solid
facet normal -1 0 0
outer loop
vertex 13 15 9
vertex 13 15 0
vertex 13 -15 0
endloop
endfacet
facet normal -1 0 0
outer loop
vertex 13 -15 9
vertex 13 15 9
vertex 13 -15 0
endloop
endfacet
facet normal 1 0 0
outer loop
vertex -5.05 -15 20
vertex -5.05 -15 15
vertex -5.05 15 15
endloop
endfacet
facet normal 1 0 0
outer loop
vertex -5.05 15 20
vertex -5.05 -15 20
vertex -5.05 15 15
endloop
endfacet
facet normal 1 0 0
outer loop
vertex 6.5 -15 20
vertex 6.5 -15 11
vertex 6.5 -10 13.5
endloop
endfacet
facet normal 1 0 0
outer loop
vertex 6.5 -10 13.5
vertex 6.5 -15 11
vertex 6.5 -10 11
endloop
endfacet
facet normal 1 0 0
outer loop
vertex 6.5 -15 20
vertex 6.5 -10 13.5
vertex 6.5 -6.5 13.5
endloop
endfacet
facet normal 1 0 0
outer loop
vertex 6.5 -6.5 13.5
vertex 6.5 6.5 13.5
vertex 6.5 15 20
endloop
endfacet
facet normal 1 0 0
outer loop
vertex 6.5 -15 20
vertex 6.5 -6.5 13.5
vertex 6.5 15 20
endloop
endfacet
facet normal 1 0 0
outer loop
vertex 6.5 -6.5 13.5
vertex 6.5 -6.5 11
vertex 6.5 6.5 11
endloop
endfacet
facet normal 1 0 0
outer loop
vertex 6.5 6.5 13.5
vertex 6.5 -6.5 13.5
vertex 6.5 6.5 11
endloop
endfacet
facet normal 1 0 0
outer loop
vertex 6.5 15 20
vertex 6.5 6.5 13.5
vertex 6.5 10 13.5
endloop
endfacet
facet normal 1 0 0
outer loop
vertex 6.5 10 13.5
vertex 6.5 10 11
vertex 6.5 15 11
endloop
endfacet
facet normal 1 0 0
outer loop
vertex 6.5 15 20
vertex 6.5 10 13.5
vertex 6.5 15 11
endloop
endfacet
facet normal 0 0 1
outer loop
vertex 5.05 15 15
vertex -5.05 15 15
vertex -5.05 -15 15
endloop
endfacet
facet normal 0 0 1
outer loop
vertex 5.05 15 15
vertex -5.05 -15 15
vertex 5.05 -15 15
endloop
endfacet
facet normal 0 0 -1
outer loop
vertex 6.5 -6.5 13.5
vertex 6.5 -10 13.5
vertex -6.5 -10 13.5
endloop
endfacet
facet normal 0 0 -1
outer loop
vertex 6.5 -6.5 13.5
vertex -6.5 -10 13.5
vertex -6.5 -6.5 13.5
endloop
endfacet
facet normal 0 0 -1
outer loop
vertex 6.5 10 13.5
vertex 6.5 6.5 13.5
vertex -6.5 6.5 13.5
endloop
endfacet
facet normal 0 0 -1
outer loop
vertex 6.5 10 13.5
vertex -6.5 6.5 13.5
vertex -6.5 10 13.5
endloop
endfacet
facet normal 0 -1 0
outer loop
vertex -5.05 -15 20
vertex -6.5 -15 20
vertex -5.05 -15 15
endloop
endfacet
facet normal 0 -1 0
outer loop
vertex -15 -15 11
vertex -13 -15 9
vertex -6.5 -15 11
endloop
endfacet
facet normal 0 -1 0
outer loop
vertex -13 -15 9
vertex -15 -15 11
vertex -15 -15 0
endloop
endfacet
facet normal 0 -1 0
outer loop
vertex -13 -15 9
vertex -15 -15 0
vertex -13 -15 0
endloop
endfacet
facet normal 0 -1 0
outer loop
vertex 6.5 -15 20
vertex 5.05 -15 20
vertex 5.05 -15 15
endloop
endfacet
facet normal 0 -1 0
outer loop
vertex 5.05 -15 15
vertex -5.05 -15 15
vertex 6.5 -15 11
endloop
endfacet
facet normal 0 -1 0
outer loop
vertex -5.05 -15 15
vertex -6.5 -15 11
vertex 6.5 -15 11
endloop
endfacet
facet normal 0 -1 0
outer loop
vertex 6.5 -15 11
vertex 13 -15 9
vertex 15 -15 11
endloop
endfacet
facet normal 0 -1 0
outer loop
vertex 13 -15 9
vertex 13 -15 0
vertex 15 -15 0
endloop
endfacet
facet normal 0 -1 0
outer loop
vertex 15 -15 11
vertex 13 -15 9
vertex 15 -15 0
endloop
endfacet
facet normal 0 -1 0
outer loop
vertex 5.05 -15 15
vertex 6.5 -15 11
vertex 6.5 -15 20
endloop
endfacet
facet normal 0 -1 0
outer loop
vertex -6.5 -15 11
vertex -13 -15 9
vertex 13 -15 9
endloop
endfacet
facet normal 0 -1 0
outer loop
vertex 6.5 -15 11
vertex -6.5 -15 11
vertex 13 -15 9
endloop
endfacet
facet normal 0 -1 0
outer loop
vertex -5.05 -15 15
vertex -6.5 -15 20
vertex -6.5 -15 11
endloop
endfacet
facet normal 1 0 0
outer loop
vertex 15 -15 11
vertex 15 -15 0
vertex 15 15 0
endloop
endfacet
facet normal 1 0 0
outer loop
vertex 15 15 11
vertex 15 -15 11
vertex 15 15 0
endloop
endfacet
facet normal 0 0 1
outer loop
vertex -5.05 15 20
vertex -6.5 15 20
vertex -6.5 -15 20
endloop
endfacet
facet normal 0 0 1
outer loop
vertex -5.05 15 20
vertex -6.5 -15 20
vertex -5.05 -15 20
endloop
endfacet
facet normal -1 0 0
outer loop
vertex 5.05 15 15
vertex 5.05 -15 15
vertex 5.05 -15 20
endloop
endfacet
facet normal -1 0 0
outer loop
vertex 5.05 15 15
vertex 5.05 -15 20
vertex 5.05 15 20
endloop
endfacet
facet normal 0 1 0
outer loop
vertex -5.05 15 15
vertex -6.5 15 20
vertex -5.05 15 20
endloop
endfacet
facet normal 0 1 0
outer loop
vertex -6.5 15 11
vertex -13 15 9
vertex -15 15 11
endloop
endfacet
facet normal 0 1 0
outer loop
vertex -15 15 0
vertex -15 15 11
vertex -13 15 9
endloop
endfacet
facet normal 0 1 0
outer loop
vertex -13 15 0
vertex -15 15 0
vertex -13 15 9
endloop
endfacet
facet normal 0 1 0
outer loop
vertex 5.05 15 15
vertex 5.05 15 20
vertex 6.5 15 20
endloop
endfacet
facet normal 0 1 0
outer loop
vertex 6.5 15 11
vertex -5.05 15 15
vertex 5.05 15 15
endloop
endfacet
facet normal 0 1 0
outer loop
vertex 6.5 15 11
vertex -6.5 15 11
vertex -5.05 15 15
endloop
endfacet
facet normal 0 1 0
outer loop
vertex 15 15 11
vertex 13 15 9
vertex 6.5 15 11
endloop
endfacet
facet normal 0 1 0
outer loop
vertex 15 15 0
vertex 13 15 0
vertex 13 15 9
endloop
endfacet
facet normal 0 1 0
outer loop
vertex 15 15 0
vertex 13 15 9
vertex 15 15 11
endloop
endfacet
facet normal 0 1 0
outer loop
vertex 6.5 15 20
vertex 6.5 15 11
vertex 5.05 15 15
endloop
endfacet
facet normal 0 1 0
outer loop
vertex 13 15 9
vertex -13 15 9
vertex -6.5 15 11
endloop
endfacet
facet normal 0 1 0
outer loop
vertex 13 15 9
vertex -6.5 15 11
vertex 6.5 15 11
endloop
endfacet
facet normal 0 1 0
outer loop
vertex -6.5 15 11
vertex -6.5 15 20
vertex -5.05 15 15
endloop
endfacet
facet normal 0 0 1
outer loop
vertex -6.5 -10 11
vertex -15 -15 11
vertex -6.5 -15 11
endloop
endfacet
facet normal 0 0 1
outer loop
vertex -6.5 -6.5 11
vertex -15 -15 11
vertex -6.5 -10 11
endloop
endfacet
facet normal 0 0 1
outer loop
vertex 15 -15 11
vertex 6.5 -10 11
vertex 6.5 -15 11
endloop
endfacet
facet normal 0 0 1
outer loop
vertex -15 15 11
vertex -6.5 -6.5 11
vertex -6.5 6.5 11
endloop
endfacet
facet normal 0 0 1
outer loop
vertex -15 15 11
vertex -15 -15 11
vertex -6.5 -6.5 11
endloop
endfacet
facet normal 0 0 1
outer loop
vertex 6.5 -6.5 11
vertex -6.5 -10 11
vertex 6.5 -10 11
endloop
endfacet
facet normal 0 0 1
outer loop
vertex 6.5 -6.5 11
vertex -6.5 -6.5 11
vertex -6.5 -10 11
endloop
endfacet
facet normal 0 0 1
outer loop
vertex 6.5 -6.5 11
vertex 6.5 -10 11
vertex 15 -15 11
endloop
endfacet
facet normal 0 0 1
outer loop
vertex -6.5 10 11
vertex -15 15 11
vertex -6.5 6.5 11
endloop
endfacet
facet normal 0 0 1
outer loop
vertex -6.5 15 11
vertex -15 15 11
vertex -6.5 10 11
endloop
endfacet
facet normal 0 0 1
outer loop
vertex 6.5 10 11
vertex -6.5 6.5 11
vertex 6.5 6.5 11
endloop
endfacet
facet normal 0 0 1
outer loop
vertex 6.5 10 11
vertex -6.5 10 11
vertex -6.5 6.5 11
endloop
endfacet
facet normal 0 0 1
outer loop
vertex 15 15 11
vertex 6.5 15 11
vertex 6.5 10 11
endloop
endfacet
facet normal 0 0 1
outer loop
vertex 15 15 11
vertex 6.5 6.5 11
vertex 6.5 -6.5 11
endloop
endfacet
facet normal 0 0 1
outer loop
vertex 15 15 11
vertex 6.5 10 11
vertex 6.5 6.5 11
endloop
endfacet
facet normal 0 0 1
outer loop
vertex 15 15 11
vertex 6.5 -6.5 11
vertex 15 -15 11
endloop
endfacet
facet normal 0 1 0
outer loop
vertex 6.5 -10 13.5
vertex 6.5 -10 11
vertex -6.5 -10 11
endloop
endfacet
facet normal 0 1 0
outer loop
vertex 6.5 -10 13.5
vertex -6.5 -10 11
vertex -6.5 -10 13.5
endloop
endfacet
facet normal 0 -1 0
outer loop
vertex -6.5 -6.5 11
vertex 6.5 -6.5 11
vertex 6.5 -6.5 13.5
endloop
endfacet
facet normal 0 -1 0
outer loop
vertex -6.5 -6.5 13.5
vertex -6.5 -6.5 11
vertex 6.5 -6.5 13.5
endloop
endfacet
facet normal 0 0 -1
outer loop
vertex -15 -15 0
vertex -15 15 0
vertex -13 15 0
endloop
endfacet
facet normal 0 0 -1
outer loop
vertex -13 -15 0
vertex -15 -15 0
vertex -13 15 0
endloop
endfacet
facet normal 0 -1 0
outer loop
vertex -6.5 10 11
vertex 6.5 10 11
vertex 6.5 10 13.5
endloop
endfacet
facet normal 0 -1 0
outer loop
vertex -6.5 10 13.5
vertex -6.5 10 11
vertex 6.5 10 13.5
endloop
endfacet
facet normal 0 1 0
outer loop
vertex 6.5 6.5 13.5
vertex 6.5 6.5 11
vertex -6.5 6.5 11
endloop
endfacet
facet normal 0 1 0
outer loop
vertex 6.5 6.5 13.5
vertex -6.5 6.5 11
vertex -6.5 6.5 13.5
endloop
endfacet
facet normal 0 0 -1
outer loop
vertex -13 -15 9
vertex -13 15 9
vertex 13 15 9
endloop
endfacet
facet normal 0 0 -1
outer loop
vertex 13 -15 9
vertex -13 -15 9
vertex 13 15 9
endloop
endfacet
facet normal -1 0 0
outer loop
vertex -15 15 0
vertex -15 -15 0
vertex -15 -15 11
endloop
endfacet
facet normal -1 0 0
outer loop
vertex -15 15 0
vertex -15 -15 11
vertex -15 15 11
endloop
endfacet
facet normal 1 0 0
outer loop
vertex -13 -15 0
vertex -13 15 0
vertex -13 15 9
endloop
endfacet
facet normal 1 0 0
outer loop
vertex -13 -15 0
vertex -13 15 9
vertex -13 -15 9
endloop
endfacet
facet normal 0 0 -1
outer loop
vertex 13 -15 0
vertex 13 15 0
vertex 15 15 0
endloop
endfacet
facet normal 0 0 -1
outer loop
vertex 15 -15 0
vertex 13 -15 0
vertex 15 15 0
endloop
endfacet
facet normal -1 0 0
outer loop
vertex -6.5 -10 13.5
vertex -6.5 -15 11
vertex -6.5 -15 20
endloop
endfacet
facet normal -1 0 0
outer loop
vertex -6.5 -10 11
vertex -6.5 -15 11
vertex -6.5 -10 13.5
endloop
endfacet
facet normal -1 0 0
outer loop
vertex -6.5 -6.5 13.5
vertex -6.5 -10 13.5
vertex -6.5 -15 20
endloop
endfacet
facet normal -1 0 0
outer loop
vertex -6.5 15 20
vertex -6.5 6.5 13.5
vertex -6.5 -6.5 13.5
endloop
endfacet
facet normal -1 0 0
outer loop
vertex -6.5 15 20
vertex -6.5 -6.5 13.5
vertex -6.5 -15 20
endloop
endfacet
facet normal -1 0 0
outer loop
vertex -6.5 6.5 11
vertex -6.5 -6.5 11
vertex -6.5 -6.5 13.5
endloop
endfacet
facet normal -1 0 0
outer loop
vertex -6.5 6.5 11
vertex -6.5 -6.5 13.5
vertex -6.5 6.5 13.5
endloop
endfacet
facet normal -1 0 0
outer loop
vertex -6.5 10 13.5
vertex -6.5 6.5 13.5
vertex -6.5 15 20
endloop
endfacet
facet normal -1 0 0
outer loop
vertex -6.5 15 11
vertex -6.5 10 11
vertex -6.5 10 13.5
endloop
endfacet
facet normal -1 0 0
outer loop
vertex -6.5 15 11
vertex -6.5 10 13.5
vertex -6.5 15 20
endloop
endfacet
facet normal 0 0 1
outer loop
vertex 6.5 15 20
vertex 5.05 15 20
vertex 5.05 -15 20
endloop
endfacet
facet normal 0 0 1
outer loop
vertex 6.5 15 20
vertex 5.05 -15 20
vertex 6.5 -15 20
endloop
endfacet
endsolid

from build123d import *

# Parameters (mm, degrees)
F0_W      = 30
F0_H      = 30
F1_DEPTH  = 11
F2_W      = 26
F2_H      = 30
F3_DEPTH  = 9
F4_W      = 1.45
F4_H      = 30
F5_DEPTH  = 9
F5_FACE_W = 10.1
F5_FACE_H = 30
F6_DEPTH  = 4
F7_W      = 3.5
F7_H      = 2.5
F8_DEPTH  = 13


with BuildPart() as f1:
    # F0 (on Top) → F1 (new body)
    with BuildSketch(Plane.XY):
        Rectangle(F0_W, F0_H)
    extrude(amount=F1_DEPTH)

    # F2 (on face) → F3 (cut)
    with BuildSketch(Plane(origin=(0, 0, 0), x_dir=(1, 0, 0), z_dir=(0, 0, -1))):
        Rectangle(F2_W, F2_H)
    extrude(amount=-F3_DEPTH, mode=Mode.SUBTRACT)

    # F4 (on face) → F5 (join)
    with BuildSketch(Plane.XY.offset(11)):
        with Locations((-5.775, 0)):
            Rectangle(F4_W, F4_H)
        with Locations((5.775, 0)):
            Rectangle(F4_W, F4_H)
    extrude(amount=F5_DEPTH)

    # F5_face (on face) → F6 (join)
    with BuildSketch(Plane.XY.offset(11)):
        Rectangle(F5_FACE_W, F5_FACE_H)
    extrude(amount=F6_DEPTH)

    # F7 (on face) → F8 (cut, through all)
    with BuildSketch(Plane.YZ.offset(6.5)):
        with Locations((-8.25, 12.25)):
            Rectangle(F7_W, F7_H)
        with Locations((8.25, 12.25)):
            Rectangle(F7_W, F7_H)
    extrude(amount=-F8_DEPTH, mode=Mode.SUBTRACT)


solid = f1.part
